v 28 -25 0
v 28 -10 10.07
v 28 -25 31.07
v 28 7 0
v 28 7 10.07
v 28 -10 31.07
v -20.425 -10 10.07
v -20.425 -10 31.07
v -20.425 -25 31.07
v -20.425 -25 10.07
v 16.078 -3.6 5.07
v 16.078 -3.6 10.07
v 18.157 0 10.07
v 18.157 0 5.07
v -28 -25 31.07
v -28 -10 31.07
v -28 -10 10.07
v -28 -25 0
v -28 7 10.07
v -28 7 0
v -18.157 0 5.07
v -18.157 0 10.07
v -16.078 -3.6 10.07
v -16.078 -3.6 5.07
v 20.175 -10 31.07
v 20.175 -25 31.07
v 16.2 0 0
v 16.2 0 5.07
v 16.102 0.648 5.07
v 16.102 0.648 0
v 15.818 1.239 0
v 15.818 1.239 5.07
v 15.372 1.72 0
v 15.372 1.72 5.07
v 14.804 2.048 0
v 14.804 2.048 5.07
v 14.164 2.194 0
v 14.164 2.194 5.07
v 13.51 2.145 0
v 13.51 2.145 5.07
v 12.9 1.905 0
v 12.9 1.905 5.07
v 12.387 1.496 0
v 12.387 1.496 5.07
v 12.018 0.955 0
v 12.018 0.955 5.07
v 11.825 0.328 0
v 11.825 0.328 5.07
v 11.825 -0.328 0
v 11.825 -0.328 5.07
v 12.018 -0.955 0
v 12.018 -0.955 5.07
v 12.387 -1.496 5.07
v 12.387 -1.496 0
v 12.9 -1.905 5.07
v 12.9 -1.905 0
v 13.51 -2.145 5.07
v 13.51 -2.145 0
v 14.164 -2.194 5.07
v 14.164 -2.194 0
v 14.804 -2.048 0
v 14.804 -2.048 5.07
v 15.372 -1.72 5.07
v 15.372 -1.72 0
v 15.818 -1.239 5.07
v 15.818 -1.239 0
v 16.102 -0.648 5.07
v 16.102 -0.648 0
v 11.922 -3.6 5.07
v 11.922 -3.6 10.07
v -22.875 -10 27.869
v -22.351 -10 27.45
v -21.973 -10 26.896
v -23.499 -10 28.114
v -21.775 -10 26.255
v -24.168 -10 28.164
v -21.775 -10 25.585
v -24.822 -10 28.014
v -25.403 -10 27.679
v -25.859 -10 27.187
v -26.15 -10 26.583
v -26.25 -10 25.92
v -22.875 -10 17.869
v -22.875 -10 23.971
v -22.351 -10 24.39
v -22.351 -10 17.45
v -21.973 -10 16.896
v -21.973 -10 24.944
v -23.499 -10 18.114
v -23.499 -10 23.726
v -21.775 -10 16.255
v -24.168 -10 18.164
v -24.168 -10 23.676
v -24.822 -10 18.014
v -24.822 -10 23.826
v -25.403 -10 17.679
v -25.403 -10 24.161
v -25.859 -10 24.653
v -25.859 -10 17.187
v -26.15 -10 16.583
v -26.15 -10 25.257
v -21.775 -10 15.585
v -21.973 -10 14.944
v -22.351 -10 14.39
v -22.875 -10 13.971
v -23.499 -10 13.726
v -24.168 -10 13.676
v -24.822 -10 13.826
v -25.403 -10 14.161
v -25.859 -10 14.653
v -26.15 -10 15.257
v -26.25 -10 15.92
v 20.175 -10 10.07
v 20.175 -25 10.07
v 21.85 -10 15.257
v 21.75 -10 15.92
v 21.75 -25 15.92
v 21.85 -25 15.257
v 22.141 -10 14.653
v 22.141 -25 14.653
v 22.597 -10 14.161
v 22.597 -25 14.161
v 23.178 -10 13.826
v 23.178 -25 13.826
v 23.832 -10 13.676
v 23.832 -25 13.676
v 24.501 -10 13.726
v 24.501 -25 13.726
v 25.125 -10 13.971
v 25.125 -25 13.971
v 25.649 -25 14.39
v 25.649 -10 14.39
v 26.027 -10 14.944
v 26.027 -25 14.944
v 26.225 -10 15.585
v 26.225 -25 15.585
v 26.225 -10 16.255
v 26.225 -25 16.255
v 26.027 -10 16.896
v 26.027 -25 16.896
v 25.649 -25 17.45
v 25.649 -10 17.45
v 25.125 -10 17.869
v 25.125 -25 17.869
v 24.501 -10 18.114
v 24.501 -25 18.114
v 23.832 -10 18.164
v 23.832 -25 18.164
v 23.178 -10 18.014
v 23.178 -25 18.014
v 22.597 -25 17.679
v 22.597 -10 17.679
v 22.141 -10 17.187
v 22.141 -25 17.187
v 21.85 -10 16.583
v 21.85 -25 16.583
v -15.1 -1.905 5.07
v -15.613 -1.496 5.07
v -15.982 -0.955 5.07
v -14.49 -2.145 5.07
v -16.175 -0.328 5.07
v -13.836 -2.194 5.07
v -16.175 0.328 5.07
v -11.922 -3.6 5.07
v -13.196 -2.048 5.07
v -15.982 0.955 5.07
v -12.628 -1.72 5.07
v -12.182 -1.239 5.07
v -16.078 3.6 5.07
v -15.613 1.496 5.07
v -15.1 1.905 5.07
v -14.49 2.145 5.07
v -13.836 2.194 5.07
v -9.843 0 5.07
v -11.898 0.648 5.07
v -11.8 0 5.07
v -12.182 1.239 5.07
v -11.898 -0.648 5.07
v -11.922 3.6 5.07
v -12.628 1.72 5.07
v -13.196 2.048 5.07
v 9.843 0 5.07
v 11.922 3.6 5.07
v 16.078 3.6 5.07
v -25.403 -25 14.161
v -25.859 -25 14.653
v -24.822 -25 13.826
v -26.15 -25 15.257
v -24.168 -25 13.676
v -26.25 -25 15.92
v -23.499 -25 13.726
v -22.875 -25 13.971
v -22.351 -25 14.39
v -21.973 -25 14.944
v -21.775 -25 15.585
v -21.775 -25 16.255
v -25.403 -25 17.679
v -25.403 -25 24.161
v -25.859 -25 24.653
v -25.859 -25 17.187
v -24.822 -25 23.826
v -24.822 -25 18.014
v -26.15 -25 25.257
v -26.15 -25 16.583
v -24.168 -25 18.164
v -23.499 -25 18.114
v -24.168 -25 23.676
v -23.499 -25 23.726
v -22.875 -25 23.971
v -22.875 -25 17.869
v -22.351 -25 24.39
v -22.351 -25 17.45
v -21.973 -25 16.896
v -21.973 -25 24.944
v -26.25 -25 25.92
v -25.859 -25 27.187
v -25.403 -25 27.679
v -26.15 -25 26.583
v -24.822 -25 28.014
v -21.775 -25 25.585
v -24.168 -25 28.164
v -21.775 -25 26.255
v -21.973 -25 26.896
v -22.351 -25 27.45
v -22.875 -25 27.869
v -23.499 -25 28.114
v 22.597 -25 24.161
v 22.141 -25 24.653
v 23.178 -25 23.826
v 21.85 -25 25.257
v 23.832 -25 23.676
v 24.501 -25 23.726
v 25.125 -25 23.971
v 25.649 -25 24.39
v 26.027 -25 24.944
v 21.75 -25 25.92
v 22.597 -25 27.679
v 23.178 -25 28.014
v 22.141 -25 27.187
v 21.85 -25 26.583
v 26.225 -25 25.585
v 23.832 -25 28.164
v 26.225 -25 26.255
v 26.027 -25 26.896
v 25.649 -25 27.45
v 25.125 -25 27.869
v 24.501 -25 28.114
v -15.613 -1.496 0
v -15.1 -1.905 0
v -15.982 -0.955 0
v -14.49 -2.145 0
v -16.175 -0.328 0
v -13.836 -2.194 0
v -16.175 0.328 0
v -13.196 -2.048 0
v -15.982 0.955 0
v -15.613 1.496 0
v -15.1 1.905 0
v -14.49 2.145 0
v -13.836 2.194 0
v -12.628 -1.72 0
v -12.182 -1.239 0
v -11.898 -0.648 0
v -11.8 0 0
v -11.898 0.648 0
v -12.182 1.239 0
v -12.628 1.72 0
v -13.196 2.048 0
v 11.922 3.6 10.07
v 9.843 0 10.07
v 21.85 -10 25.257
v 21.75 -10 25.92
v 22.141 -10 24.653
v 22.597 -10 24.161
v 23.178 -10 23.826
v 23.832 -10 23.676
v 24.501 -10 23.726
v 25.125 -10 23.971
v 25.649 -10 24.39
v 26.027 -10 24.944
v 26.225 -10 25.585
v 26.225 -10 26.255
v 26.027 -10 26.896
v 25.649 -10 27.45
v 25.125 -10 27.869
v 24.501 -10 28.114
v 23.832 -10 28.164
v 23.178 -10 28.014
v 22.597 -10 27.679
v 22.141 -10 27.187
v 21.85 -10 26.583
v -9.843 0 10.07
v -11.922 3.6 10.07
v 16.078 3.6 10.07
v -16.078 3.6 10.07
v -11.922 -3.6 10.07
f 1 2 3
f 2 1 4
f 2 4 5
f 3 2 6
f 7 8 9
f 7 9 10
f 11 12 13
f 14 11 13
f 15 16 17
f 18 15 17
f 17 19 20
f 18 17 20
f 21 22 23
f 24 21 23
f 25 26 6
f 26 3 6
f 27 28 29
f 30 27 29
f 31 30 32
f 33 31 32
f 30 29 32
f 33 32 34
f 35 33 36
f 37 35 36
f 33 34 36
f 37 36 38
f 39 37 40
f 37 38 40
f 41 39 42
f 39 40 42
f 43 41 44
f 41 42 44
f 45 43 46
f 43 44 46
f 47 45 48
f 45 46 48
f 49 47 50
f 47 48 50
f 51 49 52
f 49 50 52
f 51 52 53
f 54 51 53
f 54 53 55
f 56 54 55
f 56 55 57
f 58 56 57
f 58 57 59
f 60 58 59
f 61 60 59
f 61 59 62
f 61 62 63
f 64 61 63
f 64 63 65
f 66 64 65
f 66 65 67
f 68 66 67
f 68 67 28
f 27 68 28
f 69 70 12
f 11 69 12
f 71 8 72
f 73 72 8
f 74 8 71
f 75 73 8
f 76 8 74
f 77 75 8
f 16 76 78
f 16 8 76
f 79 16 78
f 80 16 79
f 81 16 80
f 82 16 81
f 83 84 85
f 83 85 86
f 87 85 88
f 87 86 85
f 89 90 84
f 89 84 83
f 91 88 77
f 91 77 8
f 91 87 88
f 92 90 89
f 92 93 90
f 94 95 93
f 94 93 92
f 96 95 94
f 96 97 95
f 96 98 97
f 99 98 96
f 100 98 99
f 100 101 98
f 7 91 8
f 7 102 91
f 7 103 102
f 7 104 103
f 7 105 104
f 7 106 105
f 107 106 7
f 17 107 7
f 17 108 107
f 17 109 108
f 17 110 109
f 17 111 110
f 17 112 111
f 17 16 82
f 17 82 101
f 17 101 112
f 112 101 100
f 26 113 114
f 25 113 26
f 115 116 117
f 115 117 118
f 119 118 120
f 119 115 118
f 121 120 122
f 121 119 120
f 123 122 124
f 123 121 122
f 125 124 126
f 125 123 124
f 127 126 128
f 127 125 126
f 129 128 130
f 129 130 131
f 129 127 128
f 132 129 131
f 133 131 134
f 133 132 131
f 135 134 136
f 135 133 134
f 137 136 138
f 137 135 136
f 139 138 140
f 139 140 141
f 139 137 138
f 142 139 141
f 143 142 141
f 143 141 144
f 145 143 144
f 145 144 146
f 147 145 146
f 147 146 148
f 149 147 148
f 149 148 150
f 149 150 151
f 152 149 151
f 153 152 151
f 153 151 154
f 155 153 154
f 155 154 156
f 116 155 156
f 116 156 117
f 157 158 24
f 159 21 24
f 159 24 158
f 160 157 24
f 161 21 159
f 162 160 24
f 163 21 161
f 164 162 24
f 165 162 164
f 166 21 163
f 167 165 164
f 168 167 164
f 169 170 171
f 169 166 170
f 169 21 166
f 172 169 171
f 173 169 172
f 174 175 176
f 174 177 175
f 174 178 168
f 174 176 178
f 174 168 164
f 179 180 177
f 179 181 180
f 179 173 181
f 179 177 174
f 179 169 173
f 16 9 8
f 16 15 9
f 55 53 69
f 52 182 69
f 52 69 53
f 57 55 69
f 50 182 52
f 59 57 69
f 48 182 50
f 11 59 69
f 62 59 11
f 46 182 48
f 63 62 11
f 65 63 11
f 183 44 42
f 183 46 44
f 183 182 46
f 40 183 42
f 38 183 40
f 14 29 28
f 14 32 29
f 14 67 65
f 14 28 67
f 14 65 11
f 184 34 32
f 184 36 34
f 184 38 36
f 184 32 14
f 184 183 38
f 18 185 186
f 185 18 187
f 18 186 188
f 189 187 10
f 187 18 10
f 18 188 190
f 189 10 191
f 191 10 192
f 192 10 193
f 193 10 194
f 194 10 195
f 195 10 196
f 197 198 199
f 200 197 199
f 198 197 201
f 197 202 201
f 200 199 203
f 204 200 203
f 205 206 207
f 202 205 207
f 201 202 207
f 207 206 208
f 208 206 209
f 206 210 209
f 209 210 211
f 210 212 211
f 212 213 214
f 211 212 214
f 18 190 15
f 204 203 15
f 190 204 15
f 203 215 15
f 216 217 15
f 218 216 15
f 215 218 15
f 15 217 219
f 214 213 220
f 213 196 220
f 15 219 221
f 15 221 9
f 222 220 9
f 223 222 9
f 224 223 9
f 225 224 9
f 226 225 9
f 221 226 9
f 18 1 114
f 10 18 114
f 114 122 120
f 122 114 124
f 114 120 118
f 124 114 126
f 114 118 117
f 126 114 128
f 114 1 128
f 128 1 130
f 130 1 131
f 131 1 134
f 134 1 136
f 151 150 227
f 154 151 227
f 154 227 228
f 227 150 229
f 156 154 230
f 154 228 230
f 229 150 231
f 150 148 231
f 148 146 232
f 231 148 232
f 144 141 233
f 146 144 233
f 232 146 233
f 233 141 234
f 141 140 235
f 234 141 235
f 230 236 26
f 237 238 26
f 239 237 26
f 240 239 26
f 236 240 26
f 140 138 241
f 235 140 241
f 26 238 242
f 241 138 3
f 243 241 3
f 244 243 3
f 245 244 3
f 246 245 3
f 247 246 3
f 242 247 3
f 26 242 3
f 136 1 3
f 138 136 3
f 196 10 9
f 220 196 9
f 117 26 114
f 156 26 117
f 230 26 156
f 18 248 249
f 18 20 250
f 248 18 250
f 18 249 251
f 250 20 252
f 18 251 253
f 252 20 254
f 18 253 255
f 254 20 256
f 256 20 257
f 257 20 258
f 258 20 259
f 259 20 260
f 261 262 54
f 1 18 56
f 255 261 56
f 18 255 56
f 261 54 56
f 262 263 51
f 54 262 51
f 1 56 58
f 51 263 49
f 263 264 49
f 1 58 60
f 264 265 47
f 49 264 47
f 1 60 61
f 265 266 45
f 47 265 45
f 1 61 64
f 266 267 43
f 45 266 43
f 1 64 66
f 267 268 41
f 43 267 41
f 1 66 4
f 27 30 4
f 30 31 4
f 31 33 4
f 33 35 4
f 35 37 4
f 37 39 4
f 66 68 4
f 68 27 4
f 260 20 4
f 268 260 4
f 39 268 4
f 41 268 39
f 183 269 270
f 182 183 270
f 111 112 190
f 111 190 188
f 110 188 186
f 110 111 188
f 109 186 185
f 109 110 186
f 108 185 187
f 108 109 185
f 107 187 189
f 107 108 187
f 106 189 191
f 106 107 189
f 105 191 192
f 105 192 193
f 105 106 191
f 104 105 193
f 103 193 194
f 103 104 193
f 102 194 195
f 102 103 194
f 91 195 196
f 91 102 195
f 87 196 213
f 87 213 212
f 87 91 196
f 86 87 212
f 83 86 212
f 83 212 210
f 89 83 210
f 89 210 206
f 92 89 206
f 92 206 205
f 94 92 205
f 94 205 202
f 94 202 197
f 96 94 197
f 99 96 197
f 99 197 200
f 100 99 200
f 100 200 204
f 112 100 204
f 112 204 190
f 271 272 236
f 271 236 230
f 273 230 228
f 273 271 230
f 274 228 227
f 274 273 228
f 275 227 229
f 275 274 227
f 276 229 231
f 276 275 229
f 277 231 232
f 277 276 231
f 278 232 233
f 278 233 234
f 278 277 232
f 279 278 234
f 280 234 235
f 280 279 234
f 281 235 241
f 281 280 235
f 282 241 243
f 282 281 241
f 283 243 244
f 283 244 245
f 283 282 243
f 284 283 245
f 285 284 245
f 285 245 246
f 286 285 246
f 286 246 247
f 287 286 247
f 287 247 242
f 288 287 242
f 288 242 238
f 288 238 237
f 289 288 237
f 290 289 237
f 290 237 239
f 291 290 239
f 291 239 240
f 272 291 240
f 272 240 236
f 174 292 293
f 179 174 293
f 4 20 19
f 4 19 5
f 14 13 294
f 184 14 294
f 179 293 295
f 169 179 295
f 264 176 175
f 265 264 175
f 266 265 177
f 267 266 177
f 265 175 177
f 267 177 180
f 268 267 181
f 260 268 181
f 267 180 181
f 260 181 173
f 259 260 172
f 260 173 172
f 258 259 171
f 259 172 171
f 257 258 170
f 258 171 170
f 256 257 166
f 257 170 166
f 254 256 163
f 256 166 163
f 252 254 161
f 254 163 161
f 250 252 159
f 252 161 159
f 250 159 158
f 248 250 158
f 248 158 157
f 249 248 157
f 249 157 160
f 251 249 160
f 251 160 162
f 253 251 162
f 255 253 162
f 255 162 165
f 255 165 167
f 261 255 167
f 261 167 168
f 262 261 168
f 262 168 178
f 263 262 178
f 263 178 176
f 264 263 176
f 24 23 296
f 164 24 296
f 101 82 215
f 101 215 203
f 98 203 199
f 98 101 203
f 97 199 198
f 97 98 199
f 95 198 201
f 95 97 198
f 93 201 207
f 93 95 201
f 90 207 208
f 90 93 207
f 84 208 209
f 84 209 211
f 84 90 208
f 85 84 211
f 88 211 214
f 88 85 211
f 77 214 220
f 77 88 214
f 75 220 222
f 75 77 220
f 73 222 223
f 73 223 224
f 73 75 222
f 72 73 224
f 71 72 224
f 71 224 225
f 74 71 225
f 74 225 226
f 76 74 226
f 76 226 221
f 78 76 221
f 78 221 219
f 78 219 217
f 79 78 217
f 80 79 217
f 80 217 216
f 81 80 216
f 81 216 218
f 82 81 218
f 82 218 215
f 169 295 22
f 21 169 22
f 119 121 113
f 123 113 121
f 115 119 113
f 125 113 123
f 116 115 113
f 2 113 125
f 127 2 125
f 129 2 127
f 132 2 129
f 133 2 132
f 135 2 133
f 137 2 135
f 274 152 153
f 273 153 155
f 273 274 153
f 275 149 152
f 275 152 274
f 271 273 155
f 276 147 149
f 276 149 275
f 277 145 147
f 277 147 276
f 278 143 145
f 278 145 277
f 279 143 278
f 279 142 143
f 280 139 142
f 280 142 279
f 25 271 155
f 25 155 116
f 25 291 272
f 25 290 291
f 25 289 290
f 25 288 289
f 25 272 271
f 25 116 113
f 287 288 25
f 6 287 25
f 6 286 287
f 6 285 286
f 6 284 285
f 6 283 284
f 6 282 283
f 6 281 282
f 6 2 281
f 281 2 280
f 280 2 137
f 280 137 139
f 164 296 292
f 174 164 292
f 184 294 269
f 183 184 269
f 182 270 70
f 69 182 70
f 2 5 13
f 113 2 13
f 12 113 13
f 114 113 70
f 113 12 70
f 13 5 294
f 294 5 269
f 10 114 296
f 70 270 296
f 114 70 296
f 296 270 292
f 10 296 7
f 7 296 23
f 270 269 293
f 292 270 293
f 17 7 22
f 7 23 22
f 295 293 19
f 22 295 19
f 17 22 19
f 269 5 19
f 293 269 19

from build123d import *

# Parameters (mm, degrees)
SZKIC1_W                       = 40
SZKIC1_H                       = 14
SZKIC1_R                       = 2
DODANIE_WYCI_GNI_CIE1_DEPTH    = 10.77
SZKIC2_W                       = 56
SZKIC2_H                       = 14
DODANIE_WYCI_GNI_CIE2_DEPTH    = 20.3
SZKIC5_R                       = 2.25
WYTNIJ_WYCI_GNI_CIE2_DEPTH     = 14
SZKIC8_W                       = 56
SZKIC8_H                       = 10.77
DODANIE_WYCI_GNI_CIE3_DEPTH    = 14
WYTNIJ_WYCI_GNI_CIE3_START     = -14
WYTNIJ_WYCI_GNI_CIE3_OUTLINE_W = 42
WYTNIJ_WYCI_GNI_CIE3_OUTLINE_H = 21
WYTNIJ_WYCI_GNI_CIE3_DEPTH     = 14
SZKIC12_R                      = 2.25
DODANIE_WYCI_GNI_CIE4_DEPTH    = 18
WYTNIJ_WYCI_GNI_CIE1_DEPTH     = 5
SZKIC9_R                       = 2.2
WYTNIJ_WYCI_GNI_CIE4_DEPTH     = 21
SZKIC10_W                      = 56
SZKIC10_H                      = 21
WYTNIJ_WYCI_GNI_CIE5_DEPTH     = 17
SZKIC13_W                      = 21
SZKIC13_H                      = 15
DODANIE_WYCI_GNI_CIE5_DEPTH    = 0.7
SZKIC16_W                      = 21
SZKIC16_H                      = 15
DODANIE_WYCI_GNI_CIE7_DEPTH    = 0.7


# Read off the part's stored shape, not the designer's step: Wytnij-wyciągnięcie3
with BuildPart() as part:
    # Szkic1 → Dodanie-wyciągnięcie1 (new body)
    with BuildSketch(Plane.XY):
        Rectangle(SZKIC1_W, SZKIC1_H)
        with Locations((-14, 0)):
            Circle(SZKIC1_R, mode=Mode.SUBTRACT)
        with Locations((14, 0)):
            Circle(SZKIC1_R, mode=Mode.SUBTRACT)
    extrude(amount=DODANIE_WYCI_GNI_CIE1_DEPTH)

    # Szkic2 → Dodanie-wyciągnięcie2 (add)
    with BuildSketch(Plane.XY.offset(10.77)):
        Rectangle(SZKIC2_W, SZKIC2_H)
    extrude(amount=DODANIE_WYCI_GNI_CIE2_DEPTH)

    # Szkic5 → Wytnij-wyciągnięcie2 (cut)
    with BuildSketch(Plane(origin=(0, 7, 0), x_dir=(1, 0, 0), z_dir=(0, 1, 0))):
        with Locations(Location((-24, -15.92, 0), (0, 0, 180))):
            Circle(SZKIC5_R)
        with Locations(Location((24, -15.92, 0), (0, 0, 180))):
            Circle(SZKIC5_R)
        with Locations(Location((24, -25.92, 0), (0, 0, 180))):
            Circle(SZKIC5_R)
        with Locations(Location((-24, -25.92, 0), (0, 0, 180))):
            Circle(SZKIC5_R)
    extrude(amount=-WYTNIJ_WYCI_GNI_CIE2_DEPTH, mode=Mode.SUBTRACT)

    # Szkic8 → Dodanie-wyciągnięcie3 (add)
    with BuildSketch(Plane(origin=(0, 7, 0), x_dir=(1, 0, 0), z_dir=(0, 1, 0))):
        with Locations((0, -5.385)):
            Rectangle(SZKIC8_W, SZKIC8_H)
    extrude(amount=-DODANIE_WYCI_GNI_CIE3_DEPTH)

    # Wytnij-wyciągnięcie3 outline → Wytnij-wyciągnięcie3 (cut)
    with BuildSketch(Plane(origin=(0, 7, 0), x_dir=(1, 0, 0), z_dir=(0, 1, 0)).offset(WYTNIJ_WYCI_GNI_CIE3_START)):
        with Locations((-0.124911353, -20.57)):
            Rectangle(WYTNIJ_WYCI_GNI_CIE3_OUTLINE_W, WYTNIJ_WYCI_GNI_CIE3_OUTLINE_H)
    extrude(amount=WYTNIJ_WYCI_GNI_CIE3_DEPTH, mode=Mode.SUBTRACT)

    # Szkic12 → Dodanie-wyciągnięcie4 (add)
    with BuildSketch(Plane.XZ.offset(7)):
        Polygon((20.875088647, 31.07), (20.875088647, 10.07), (-21.124911353, 10.07), (-21.124911353, 31.07), (-28, 31.07), (-28, 0), (28, 0), (28, 31.07), align=None)
        with Locations(Location((-24, 25.92, 0), (0, 0, 180))):
            Circle(SZKIC12_R, mode=Mode.SUBTRACT)
        with Locations(Location((24, 25.92, 0), (0, 0, 180))):
            Circle(SZKIC12_R, mode=Mode.SUBTRACT)
        with Locations(Location((-24, 15.92, 0), (0, 0, 180))):
            Circle(SZKIC12_R, mode=Mode.SUBTRACT)
        with Locations(Location((24, 15.92, 0), (0, 0, 180))):
            Circle(SZKIC12_R, mode=Mode.SUBTRACT)
    extrude(amount=DODANIE_WYCI_GNI_CIE4_DEPTH)

    # Szkic4 → Wytnij-wyciągnięcie1 (cut)
    with BuildSketch(Plane.XY.offset(10.07)):
        Polygon((-16.078460969, 3.6), (-18.156921938, 0), (-16.078460969, -3.6), (-11.921539031, -3.6), (-9.843078062, 0), (-11.921539031, 3.6), align=None)
        Polygon((11.921539031, 3.6), (9.843078062, 0), (11.921539031, -3.6), (16.078460969, -3.6), (18.156921938, 0), (16.078460969, 3.6), align=None)
    extrude(amount=-WYTNIJ_WYCI_GNI_CIE1_DEPTH, mode=Mode.SUBTRACT)

    # Szkic9 → Wytnij-wyciągnięcie4 (cut)
    with BuildSketch(Plane.XY.offset(10.07)):
        with Locations((-14, 0)):
            Circle(SZKIC9_R)
        with Locations((14, 0)):
            Circle(SZKIC9_R)
    extrude(amount=-WYTNIJ_WYCI_GNI_CIE4_DEPTH, mode=Mode.SUBTRACT)

    # Szkic10 → Wytnij-wyciągnięcie5 (cut)
    with BuildSketch(Plane(origin=(0, 7, 0), x_dir=(1, 0, 0), z_dir=(0, 1, 0))):
        with Locations((0, -20.57)):
            Rectangle(SZKIC10_W, SZKIC10_H)
    extrude(amount=-WYTNIJ_WYCI_GNI_CIE5_DEPTH, mode=Mode.SUBTRACT)

    # Szkic13 → Dodanie-wyciągnięcie5 (add)
    with BuildSketch(Plane(origin=(-21.124911353, 0, 0), x_dir=(0, 0, -1), z_dir=(1, 0, 0))):
        with Locations((-20.57, -17.5)):
            Rectangle(SZKIC13_W, SZKIC13_H)
    extrude(amount=DODANIE_WYCI_GNI_CIE5_DEPTH)

    # Szkic16 → Dodanie-wyciągnięcie7 (add)
    with BuildSketch(Plane.ZY.offset(-20.875088647)):
        with Locations((20.57, -17.5)):
            Rectangle(SZKIC16_W, SZKIC16_H)
    extrude(amount=DODANIE_WYCI_GNI_CIE7_DEPTH)


solid = part.part
